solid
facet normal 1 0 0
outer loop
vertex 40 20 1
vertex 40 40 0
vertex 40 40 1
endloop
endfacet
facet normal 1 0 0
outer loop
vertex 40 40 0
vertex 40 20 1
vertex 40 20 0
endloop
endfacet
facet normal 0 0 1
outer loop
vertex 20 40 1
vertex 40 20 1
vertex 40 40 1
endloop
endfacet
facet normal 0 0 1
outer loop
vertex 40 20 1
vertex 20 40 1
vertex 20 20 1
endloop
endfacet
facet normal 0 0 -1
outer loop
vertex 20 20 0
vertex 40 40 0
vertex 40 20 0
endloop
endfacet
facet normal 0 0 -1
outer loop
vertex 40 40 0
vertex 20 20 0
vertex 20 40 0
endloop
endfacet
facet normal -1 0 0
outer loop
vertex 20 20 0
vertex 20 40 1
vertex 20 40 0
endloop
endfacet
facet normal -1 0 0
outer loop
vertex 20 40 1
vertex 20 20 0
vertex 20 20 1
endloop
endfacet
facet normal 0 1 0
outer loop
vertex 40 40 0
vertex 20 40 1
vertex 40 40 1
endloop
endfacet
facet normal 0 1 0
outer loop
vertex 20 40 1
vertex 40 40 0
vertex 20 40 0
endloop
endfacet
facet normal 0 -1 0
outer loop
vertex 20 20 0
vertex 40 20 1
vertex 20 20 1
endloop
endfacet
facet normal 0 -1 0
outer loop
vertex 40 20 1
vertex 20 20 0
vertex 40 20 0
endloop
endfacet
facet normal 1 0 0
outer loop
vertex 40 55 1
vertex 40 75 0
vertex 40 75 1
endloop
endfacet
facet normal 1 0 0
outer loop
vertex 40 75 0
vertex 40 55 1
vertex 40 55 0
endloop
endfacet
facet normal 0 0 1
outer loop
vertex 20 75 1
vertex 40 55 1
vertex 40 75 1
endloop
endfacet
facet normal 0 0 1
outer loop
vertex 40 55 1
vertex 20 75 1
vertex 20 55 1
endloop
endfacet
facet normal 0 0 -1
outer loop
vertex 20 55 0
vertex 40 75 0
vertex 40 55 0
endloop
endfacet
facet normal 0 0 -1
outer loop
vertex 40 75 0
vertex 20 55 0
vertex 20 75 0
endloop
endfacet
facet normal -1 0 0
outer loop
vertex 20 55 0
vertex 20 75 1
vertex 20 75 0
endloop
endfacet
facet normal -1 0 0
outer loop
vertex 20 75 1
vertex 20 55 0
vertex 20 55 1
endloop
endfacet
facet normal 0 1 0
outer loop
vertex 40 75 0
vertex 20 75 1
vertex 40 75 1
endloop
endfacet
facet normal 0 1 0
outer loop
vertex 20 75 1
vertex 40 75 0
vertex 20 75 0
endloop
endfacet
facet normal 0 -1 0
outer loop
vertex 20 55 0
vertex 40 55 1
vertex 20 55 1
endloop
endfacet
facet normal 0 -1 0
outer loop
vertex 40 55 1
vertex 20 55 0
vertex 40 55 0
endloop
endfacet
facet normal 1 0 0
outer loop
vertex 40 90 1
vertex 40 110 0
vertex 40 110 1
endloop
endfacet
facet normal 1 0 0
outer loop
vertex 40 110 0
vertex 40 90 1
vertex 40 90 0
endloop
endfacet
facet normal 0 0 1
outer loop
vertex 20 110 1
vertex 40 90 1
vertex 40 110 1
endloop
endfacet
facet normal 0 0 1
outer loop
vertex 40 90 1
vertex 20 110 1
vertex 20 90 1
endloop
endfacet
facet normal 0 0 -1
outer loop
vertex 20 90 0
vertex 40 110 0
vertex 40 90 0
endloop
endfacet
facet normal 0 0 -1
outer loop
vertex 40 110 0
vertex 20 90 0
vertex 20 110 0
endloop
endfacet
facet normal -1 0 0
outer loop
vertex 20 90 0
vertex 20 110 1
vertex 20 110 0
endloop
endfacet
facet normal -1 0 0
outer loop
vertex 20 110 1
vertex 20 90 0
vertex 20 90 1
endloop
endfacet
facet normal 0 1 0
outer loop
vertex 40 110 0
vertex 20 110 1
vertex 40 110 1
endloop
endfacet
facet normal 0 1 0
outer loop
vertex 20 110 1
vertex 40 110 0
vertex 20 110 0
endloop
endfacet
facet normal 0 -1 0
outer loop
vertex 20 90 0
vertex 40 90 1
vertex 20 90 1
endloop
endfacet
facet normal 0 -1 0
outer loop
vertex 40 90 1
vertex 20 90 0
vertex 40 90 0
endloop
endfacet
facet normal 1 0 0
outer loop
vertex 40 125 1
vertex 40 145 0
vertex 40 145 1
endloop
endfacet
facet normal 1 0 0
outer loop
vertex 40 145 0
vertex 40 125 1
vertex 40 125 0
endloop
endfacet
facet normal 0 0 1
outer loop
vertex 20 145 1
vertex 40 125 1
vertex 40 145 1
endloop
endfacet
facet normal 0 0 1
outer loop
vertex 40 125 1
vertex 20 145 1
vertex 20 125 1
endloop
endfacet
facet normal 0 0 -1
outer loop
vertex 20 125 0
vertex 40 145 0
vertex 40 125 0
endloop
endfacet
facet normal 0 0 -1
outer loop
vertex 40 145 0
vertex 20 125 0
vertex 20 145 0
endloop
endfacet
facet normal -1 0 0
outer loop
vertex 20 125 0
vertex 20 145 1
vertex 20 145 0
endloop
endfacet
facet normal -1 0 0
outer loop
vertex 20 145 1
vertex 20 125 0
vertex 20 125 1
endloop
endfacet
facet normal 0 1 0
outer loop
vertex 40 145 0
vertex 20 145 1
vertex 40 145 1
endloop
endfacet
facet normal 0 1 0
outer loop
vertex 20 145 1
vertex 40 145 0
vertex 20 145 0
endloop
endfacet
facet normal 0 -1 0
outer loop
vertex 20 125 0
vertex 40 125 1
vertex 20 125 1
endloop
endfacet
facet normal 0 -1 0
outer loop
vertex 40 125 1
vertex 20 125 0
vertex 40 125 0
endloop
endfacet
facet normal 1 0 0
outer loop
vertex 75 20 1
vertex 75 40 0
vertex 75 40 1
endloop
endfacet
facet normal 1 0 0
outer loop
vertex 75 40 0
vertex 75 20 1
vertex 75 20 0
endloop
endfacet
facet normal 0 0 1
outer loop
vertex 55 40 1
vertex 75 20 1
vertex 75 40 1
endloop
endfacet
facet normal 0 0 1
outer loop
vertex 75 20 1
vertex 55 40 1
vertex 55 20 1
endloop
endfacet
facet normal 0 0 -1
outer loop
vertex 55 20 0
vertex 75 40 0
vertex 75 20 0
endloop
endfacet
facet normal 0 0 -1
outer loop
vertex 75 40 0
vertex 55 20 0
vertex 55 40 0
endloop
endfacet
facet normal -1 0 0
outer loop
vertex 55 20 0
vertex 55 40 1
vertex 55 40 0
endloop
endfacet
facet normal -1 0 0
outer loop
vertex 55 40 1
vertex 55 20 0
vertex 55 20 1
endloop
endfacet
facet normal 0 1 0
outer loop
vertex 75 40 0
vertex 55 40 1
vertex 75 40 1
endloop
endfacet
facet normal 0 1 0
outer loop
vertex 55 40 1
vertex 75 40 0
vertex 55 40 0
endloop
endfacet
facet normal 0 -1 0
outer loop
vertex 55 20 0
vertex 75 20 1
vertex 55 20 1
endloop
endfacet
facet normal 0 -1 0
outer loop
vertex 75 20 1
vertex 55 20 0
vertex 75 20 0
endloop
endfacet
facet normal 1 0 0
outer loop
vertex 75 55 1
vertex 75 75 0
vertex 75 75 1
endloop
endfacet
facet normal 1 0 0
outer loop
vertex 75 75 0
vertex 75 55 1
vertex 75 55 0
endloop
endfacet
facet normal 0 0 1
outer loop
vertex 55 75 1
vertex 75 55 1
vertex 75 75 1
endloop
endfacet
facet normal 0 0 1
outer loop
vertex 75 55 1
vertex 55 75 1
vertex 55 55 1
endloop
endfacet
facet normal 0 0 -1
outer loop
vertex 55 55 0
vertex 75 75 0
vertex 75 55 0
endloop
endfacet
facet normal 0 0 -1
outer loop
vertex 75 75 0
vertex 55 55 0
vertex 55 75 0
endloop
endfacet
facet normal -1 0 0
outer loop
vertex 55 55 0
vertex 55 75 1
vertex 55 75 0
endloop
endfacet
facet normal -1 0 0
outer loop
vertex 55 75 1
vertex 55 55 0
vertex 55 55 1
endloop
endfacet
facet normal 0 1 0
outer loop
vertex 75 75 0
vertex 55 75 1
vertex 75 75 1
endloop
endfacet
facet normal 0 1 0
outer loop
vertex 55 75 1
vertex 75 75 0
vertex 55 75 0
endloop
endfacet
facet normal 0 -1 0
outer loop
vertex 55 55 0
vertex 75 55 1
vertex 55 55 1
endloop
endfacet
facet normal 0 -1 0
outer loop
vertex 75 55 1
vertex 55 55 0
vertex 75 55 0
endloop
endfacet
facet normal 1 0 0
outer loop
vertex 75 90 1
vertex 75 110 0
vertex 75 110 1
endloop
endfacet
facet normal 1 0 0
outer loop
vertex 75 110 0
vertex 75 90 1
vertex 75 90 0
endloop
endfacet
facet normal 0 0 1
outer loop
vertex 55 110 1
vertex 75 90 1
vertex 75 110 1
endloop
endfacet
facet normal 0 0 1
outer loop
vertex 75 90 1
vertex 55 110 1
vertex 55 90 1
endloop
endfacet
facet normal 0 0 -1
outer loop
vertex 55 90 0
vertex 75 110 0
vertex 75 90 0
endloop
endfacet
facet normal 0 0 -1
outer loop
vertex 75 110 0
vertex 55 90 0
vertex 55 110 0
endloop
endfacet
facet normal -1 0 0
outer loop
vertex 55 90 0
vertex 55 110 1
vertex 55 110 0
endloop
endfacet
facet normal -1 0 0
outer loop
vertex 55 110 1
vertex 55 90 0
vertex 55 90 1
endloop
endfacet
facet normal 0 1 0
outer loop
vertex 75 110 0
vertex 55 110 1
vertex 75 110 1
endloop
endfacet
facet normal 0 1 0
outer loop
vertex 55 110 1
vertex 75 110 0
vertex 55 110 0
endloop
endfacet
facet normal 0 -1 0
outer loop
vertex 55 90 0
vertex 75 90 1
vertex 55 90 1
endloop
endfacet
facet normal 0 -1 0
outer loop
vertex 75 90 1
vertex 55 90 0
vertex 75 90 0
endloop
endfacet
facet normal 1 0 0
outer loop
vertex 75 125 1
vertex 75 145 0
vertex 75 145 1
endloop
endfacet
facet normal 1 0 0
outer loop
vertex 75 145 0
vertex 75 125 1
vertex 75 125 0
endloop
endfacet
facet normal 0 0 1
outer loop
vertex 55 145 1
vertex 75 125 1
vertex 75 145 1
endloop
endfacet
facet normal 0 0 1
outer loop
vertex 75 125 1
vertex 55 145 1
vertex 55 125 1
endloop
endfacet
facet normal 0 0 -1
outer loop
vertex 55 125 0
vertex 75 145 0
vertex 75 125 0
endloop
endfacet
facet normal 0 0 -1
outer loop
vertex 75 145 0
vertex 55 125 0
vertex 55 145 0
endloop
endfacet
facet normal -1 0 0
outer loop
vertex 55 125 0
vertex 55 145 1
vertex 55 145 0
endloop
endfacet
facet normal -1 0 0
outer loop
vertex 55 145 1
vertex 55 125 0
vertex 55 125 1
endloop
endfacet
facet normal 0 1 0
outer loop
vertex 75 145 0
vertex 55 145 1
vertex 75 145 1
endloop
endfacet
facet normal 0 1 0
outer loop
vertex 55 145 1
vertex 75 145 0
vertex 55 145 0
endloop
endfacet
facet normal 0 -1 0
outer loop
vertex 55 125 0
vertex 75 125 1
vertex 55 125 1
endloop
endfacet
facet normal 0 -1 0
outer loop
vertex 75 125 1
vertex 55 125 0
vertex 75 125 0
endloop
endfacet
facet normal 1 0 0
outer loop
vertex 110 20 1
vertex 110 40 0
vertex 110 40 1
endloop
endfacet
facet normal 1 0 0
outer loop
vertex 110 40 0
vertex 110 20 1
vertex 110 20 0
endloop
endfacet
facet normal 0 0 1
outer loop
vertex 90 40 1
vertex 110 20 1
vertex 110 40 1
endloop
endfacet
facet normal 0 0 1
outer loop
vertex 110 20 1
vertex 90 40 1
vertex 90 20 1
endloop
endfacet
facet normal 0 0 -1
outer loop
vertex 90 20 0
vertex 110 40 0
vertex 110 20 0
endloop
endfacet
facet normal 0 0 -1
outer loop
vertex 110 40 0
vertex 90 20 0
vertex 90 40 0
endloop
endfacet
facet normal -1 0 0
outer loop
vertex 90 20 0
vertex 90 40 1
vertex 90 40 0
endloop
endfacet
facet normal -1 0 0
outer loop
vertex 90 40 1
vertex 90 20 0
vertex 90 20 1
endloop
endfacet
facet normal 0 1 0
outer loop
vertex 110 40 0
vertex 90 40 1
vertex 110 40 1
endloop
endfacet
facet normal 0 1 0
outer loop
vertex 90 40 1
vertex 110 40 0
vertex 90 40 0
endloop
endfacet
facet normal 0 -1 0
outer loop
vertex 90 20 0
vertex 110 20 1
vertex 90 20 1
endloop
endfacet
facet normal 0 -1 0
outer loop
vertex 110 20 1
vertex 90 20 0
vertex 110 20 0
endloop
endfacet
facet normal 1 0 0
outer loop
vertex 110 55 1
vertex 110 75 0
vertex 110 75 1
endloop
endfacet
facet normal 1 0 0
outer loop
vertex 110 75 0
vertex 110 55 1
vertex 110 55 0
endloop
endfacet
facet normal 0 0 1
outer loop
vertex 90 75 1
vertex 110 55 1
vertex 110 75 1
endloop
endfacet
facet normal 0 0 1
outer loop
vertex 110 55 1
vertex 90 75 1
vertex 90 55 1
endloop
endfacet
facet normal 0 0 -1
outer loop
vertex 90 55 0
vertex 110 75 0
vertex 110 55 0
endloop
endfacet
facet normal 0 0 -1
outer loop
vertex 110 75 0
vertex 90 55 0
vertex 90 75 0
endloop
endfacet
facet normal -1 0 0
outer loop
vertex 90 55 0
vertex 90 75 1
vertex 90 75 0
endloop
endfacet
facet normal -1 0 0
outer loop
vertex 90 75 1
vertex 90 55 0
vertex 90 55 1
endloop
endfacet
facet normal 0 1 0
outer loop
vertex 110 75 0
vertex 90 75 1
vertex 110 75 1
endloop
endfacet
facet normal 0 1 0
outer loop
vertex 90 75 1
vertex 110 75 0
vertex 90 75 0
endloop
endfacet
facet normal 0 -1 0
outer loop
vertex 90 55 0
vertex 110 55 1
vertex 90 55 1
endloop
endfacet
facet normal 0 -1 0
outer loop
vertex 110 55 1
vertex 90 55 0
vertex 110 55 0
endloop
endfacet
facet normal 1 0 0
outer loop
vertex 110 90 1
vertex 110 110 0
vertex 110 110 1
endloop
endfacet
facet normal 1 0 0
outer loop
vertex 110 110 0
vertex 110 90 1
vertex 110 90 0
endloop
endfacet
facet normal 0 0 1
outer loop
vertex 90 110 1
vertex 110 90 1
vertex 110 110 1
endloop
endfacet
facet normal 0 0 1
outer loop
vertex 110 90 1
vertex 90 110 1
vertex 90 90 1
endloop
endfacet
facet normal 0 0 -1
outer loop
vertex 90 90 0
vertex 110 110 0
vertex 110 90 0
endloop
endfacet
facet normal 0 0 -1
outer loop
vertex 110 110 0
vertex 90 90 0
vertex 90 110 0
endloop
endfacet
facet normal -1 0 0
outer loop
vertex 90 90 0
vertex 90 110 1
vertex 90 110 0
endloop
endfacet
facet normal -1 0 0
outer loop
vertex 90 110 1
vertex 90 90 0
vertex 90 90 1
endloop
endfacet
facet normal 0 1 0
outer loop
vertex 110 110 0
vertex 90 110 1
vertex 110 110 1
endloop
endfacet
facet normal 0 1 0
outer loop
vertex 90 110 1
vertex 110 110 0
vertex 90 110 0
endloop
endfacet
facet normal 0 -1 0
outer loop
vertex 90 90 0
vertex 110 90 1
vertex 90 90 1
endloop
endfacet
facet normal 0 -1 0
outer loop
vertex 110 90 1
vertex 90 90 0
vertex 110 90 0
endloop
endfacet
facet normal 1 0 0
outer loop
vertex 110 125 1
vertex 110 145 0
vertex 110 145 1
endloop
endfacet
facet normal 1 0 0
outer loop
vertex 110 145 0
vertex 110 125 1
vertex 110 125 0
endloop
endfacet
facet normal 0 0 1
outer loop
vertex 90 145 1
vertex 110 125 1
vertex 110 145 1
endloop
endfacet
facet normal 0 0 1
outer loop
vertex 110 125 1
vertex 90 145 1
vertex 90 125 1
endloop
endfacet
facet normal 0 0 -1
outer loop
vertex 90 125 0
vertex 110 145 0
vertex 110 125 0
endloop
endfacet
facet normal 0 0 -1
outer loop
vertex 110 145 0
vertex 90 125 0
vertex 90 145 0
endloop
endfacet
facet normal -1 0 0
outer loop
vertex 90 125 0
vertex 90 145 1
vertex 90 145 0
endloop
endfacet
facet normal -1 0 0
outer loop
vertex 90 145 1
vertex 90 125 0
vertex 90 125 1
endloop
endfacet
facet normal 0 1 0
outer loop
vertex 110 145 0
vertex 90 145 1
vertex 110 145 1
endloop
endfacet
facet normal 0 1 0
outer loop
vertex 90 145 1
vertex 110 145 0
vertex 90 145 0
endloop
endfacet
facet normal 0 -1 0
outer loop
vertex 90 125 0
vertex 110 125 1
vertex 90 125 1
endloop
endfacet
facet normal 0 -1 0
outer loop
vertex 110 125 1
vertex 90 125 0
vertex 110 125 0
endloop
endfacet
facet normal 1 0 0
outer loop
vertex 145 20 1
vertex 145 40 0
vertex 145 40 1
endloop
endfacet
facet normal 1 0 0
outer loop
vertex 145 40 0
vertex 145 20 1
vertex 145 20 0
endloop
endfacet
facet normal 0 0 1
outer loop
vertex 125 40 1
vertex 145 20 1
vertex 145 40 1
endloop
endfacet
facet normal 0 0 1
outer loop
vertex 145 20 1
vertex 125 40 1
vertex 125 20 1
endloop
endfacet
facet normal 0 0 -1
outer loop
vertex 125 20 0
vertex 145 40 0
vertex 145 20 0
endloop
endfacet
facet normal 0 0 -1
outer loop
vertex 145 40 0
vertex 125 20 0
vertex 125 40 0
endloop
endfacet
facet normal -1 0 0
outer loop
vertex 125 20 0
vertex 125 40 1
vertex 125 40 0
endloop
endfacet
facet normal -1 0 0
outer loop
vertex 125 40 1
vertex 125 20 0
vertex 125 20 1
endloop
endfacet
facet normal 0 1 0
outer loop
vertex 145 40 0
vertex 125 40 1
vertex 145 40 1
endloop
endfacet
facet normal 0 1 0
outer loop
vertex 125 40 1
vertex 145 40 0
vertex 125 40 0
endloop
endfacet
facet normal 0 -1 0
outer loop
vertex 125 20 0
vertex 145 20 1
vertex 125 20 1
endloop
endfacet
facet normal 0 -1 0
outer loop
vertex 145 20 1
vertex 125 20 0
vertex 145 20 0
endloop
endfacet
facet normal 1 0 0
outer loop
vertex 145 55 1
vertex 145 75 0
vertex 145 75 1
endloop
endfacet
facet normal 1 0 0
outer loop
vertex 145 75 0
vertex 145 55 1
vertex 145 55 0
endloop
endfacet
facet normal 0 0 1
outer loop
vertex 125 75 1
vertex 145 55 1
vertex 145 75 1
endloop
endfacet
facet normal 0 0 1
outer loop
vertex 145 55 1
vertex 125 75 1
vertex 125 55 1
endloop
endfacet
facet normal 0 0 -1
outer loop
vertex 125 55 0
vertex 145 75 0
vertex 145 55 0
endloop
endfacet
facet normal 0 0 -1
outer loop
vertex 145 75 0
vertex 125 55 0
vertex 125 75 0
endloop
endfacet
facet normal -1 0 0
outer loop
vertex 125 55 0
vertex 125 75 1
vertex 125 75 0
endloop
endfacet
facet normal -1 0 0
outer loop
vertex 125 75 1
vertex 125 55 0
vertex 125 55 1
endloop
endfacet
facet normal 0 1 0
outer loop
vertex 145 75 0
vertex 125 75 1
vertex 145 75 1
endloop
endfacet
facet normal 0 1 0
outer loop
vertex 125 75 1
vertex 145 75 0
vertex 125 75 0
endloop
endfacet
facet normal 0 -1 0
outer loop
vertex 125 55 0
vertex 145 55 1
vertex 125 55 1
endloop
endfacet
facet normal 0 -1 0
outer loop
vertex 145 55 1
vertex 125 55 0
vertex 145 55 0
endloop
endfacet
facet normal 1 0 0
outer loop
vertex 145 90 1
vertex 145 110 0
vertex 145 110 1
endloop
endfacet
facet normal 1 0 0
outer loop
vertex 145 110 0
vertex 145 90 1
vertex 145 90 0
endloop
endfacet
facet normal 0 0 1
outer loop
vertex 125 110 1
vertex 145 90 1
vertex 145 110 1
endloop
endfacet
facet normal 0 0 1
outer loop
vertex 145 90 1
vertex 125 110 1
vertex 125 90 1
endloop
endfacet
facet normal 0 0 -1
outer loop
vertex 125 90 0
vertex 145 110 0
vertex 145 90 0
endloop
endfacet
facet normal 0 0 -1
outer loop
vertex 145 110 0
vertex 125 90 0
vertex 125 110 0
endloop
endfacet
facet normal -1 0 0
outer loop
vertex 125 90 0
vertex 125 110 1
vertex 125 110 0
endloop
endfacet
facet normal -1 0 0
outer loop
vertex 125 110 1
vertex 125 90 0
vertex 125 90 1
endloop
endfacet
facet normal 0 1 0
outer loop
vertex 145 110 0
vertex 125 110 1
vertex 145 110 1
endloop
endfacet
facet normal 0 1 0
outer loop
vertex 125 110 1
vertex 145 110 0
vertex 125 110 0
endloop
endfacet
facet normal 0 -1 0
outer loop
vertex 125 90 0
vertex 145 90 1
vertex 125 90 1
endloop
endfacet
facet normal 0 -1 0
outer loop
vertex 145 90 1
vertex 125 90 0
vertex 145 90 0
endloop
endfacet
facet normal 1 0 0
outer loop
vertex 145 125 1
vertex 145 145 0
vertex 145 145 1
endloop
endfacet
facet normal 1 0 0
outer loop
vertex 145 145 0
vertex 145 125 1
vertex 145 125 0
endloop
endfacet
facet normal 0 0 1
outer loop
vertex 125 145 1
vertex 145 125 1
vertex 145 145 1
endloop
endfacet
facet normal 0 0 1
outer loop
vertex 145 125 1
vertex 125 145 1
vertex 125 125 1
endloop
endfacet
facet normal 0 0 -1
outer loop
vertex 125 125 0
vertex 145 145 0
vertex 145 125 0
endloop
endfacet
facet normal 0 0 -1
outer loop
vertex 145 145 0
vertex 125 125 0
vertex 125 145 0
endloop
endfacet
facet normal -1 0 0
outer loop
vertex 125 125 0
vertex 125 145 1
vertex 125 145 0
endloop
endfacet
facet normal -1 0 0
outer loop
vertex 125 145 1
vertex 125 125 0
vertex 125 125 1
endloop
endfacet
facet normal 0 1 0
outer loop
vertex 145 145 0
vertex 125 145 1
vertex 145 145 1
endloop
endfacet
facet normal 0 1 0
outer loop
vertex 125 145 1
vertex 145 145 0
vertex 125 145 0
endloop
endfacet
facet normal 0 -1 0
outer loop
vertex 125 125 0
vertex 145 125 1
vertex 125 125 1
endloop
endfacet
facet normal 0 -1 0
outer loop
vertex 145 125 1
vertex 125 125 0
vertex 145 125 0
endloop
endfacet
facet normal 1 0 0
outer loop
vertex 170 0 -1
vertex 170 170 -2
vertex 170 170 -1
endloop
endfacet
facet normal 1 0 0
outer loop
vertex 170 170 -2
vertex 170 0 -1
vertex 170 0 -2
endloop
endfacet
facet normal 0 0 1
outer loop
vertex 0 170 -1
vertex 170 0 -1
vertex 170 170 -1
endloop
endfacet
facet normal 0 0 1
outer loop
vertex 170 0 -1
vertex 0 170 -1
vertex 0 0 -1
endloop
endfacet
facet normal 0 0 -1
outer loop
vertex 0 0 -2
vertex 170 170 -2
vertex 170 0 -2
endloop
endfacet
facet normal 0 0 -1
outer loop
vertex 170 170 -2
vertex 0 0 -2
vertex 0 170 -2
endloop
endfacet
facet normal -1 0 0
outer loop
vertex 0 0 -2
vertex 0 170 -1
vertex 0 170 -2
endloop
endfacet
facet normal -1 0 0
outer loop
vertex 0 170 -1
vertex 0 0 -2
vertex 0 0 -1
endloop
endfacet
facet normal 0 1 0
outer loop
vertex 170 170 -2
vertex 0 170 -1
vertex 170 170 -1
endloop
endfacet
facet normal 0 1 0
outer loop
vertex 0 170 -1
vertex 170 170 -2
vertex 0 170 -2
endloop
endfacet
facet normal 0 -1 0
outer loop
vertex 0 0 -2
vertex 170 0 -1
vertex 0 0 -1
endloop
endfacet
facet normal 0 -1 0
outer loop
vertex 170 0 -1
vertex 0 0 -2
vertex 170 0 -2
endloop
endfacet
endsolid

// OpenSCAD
color1 = "yellow"; // [blue, green, red, white, yellow]

color2 = "yellow"; // [blue, green, red, white, yellow]

color3 = "yellow"; // [blue, green, red, white, yellow]

color4 = "yellow"; // [blue, green, red, white, yellow]

color5 = "yellow"; // [blue, green, red, white, yellow]

color6 = "yellow"; // [blue, green, red, white, yellow]

color7 = "yellow"; // [blue, green, red, white, yellow]

color8 = "yellow"; // [blue, green, red, white, yellow]

color9 = "yellow"; // [blue, green, red, white, yellow]

color10 = "yellow"; // [blue, green, red, white, yellow]

color11 = "yellow"; // [blue, green, red, white, yellow]

color12 = "yellow"; // [blue, green, red, white, yellow]

color13 = "yellow"; // [blue, green, red, white, yellow]

color14 = "yellow"; // [blue, green, red, white, yellow]

color15 = "yellow"; // [blue, green, red, white, yellow]

color16 = "yellow"; // [blue, green, red, white, yellow]

/* [Hidden] */

colors = [color1, color2, color3, color4, color5, color6, color7, color8, color9, color10, color11, color12, color13, color14, color15, color16];

step = 1;
sideLength = 20;
spacing = 35;

rows = 4;
columns = 4;

for(x = [0 : step : rows-1],
    y = [0 : step : columns-1])
{
    xTranslate = sideLength + (x * spacing);
    yTranslate = sideLength + (y * spacing);

    index = x * rows + y;
    echo("index: ", index);

    color( colors[index] )
    translate([xTranslate, yTranslate, 0])
    cube([sideLength, sideLength, 1]);
}

backgroundWidth = 170;
color("white")
translate([0, 0, -2])
cube([backgroundWidth, backgroundWidth, 1]);
